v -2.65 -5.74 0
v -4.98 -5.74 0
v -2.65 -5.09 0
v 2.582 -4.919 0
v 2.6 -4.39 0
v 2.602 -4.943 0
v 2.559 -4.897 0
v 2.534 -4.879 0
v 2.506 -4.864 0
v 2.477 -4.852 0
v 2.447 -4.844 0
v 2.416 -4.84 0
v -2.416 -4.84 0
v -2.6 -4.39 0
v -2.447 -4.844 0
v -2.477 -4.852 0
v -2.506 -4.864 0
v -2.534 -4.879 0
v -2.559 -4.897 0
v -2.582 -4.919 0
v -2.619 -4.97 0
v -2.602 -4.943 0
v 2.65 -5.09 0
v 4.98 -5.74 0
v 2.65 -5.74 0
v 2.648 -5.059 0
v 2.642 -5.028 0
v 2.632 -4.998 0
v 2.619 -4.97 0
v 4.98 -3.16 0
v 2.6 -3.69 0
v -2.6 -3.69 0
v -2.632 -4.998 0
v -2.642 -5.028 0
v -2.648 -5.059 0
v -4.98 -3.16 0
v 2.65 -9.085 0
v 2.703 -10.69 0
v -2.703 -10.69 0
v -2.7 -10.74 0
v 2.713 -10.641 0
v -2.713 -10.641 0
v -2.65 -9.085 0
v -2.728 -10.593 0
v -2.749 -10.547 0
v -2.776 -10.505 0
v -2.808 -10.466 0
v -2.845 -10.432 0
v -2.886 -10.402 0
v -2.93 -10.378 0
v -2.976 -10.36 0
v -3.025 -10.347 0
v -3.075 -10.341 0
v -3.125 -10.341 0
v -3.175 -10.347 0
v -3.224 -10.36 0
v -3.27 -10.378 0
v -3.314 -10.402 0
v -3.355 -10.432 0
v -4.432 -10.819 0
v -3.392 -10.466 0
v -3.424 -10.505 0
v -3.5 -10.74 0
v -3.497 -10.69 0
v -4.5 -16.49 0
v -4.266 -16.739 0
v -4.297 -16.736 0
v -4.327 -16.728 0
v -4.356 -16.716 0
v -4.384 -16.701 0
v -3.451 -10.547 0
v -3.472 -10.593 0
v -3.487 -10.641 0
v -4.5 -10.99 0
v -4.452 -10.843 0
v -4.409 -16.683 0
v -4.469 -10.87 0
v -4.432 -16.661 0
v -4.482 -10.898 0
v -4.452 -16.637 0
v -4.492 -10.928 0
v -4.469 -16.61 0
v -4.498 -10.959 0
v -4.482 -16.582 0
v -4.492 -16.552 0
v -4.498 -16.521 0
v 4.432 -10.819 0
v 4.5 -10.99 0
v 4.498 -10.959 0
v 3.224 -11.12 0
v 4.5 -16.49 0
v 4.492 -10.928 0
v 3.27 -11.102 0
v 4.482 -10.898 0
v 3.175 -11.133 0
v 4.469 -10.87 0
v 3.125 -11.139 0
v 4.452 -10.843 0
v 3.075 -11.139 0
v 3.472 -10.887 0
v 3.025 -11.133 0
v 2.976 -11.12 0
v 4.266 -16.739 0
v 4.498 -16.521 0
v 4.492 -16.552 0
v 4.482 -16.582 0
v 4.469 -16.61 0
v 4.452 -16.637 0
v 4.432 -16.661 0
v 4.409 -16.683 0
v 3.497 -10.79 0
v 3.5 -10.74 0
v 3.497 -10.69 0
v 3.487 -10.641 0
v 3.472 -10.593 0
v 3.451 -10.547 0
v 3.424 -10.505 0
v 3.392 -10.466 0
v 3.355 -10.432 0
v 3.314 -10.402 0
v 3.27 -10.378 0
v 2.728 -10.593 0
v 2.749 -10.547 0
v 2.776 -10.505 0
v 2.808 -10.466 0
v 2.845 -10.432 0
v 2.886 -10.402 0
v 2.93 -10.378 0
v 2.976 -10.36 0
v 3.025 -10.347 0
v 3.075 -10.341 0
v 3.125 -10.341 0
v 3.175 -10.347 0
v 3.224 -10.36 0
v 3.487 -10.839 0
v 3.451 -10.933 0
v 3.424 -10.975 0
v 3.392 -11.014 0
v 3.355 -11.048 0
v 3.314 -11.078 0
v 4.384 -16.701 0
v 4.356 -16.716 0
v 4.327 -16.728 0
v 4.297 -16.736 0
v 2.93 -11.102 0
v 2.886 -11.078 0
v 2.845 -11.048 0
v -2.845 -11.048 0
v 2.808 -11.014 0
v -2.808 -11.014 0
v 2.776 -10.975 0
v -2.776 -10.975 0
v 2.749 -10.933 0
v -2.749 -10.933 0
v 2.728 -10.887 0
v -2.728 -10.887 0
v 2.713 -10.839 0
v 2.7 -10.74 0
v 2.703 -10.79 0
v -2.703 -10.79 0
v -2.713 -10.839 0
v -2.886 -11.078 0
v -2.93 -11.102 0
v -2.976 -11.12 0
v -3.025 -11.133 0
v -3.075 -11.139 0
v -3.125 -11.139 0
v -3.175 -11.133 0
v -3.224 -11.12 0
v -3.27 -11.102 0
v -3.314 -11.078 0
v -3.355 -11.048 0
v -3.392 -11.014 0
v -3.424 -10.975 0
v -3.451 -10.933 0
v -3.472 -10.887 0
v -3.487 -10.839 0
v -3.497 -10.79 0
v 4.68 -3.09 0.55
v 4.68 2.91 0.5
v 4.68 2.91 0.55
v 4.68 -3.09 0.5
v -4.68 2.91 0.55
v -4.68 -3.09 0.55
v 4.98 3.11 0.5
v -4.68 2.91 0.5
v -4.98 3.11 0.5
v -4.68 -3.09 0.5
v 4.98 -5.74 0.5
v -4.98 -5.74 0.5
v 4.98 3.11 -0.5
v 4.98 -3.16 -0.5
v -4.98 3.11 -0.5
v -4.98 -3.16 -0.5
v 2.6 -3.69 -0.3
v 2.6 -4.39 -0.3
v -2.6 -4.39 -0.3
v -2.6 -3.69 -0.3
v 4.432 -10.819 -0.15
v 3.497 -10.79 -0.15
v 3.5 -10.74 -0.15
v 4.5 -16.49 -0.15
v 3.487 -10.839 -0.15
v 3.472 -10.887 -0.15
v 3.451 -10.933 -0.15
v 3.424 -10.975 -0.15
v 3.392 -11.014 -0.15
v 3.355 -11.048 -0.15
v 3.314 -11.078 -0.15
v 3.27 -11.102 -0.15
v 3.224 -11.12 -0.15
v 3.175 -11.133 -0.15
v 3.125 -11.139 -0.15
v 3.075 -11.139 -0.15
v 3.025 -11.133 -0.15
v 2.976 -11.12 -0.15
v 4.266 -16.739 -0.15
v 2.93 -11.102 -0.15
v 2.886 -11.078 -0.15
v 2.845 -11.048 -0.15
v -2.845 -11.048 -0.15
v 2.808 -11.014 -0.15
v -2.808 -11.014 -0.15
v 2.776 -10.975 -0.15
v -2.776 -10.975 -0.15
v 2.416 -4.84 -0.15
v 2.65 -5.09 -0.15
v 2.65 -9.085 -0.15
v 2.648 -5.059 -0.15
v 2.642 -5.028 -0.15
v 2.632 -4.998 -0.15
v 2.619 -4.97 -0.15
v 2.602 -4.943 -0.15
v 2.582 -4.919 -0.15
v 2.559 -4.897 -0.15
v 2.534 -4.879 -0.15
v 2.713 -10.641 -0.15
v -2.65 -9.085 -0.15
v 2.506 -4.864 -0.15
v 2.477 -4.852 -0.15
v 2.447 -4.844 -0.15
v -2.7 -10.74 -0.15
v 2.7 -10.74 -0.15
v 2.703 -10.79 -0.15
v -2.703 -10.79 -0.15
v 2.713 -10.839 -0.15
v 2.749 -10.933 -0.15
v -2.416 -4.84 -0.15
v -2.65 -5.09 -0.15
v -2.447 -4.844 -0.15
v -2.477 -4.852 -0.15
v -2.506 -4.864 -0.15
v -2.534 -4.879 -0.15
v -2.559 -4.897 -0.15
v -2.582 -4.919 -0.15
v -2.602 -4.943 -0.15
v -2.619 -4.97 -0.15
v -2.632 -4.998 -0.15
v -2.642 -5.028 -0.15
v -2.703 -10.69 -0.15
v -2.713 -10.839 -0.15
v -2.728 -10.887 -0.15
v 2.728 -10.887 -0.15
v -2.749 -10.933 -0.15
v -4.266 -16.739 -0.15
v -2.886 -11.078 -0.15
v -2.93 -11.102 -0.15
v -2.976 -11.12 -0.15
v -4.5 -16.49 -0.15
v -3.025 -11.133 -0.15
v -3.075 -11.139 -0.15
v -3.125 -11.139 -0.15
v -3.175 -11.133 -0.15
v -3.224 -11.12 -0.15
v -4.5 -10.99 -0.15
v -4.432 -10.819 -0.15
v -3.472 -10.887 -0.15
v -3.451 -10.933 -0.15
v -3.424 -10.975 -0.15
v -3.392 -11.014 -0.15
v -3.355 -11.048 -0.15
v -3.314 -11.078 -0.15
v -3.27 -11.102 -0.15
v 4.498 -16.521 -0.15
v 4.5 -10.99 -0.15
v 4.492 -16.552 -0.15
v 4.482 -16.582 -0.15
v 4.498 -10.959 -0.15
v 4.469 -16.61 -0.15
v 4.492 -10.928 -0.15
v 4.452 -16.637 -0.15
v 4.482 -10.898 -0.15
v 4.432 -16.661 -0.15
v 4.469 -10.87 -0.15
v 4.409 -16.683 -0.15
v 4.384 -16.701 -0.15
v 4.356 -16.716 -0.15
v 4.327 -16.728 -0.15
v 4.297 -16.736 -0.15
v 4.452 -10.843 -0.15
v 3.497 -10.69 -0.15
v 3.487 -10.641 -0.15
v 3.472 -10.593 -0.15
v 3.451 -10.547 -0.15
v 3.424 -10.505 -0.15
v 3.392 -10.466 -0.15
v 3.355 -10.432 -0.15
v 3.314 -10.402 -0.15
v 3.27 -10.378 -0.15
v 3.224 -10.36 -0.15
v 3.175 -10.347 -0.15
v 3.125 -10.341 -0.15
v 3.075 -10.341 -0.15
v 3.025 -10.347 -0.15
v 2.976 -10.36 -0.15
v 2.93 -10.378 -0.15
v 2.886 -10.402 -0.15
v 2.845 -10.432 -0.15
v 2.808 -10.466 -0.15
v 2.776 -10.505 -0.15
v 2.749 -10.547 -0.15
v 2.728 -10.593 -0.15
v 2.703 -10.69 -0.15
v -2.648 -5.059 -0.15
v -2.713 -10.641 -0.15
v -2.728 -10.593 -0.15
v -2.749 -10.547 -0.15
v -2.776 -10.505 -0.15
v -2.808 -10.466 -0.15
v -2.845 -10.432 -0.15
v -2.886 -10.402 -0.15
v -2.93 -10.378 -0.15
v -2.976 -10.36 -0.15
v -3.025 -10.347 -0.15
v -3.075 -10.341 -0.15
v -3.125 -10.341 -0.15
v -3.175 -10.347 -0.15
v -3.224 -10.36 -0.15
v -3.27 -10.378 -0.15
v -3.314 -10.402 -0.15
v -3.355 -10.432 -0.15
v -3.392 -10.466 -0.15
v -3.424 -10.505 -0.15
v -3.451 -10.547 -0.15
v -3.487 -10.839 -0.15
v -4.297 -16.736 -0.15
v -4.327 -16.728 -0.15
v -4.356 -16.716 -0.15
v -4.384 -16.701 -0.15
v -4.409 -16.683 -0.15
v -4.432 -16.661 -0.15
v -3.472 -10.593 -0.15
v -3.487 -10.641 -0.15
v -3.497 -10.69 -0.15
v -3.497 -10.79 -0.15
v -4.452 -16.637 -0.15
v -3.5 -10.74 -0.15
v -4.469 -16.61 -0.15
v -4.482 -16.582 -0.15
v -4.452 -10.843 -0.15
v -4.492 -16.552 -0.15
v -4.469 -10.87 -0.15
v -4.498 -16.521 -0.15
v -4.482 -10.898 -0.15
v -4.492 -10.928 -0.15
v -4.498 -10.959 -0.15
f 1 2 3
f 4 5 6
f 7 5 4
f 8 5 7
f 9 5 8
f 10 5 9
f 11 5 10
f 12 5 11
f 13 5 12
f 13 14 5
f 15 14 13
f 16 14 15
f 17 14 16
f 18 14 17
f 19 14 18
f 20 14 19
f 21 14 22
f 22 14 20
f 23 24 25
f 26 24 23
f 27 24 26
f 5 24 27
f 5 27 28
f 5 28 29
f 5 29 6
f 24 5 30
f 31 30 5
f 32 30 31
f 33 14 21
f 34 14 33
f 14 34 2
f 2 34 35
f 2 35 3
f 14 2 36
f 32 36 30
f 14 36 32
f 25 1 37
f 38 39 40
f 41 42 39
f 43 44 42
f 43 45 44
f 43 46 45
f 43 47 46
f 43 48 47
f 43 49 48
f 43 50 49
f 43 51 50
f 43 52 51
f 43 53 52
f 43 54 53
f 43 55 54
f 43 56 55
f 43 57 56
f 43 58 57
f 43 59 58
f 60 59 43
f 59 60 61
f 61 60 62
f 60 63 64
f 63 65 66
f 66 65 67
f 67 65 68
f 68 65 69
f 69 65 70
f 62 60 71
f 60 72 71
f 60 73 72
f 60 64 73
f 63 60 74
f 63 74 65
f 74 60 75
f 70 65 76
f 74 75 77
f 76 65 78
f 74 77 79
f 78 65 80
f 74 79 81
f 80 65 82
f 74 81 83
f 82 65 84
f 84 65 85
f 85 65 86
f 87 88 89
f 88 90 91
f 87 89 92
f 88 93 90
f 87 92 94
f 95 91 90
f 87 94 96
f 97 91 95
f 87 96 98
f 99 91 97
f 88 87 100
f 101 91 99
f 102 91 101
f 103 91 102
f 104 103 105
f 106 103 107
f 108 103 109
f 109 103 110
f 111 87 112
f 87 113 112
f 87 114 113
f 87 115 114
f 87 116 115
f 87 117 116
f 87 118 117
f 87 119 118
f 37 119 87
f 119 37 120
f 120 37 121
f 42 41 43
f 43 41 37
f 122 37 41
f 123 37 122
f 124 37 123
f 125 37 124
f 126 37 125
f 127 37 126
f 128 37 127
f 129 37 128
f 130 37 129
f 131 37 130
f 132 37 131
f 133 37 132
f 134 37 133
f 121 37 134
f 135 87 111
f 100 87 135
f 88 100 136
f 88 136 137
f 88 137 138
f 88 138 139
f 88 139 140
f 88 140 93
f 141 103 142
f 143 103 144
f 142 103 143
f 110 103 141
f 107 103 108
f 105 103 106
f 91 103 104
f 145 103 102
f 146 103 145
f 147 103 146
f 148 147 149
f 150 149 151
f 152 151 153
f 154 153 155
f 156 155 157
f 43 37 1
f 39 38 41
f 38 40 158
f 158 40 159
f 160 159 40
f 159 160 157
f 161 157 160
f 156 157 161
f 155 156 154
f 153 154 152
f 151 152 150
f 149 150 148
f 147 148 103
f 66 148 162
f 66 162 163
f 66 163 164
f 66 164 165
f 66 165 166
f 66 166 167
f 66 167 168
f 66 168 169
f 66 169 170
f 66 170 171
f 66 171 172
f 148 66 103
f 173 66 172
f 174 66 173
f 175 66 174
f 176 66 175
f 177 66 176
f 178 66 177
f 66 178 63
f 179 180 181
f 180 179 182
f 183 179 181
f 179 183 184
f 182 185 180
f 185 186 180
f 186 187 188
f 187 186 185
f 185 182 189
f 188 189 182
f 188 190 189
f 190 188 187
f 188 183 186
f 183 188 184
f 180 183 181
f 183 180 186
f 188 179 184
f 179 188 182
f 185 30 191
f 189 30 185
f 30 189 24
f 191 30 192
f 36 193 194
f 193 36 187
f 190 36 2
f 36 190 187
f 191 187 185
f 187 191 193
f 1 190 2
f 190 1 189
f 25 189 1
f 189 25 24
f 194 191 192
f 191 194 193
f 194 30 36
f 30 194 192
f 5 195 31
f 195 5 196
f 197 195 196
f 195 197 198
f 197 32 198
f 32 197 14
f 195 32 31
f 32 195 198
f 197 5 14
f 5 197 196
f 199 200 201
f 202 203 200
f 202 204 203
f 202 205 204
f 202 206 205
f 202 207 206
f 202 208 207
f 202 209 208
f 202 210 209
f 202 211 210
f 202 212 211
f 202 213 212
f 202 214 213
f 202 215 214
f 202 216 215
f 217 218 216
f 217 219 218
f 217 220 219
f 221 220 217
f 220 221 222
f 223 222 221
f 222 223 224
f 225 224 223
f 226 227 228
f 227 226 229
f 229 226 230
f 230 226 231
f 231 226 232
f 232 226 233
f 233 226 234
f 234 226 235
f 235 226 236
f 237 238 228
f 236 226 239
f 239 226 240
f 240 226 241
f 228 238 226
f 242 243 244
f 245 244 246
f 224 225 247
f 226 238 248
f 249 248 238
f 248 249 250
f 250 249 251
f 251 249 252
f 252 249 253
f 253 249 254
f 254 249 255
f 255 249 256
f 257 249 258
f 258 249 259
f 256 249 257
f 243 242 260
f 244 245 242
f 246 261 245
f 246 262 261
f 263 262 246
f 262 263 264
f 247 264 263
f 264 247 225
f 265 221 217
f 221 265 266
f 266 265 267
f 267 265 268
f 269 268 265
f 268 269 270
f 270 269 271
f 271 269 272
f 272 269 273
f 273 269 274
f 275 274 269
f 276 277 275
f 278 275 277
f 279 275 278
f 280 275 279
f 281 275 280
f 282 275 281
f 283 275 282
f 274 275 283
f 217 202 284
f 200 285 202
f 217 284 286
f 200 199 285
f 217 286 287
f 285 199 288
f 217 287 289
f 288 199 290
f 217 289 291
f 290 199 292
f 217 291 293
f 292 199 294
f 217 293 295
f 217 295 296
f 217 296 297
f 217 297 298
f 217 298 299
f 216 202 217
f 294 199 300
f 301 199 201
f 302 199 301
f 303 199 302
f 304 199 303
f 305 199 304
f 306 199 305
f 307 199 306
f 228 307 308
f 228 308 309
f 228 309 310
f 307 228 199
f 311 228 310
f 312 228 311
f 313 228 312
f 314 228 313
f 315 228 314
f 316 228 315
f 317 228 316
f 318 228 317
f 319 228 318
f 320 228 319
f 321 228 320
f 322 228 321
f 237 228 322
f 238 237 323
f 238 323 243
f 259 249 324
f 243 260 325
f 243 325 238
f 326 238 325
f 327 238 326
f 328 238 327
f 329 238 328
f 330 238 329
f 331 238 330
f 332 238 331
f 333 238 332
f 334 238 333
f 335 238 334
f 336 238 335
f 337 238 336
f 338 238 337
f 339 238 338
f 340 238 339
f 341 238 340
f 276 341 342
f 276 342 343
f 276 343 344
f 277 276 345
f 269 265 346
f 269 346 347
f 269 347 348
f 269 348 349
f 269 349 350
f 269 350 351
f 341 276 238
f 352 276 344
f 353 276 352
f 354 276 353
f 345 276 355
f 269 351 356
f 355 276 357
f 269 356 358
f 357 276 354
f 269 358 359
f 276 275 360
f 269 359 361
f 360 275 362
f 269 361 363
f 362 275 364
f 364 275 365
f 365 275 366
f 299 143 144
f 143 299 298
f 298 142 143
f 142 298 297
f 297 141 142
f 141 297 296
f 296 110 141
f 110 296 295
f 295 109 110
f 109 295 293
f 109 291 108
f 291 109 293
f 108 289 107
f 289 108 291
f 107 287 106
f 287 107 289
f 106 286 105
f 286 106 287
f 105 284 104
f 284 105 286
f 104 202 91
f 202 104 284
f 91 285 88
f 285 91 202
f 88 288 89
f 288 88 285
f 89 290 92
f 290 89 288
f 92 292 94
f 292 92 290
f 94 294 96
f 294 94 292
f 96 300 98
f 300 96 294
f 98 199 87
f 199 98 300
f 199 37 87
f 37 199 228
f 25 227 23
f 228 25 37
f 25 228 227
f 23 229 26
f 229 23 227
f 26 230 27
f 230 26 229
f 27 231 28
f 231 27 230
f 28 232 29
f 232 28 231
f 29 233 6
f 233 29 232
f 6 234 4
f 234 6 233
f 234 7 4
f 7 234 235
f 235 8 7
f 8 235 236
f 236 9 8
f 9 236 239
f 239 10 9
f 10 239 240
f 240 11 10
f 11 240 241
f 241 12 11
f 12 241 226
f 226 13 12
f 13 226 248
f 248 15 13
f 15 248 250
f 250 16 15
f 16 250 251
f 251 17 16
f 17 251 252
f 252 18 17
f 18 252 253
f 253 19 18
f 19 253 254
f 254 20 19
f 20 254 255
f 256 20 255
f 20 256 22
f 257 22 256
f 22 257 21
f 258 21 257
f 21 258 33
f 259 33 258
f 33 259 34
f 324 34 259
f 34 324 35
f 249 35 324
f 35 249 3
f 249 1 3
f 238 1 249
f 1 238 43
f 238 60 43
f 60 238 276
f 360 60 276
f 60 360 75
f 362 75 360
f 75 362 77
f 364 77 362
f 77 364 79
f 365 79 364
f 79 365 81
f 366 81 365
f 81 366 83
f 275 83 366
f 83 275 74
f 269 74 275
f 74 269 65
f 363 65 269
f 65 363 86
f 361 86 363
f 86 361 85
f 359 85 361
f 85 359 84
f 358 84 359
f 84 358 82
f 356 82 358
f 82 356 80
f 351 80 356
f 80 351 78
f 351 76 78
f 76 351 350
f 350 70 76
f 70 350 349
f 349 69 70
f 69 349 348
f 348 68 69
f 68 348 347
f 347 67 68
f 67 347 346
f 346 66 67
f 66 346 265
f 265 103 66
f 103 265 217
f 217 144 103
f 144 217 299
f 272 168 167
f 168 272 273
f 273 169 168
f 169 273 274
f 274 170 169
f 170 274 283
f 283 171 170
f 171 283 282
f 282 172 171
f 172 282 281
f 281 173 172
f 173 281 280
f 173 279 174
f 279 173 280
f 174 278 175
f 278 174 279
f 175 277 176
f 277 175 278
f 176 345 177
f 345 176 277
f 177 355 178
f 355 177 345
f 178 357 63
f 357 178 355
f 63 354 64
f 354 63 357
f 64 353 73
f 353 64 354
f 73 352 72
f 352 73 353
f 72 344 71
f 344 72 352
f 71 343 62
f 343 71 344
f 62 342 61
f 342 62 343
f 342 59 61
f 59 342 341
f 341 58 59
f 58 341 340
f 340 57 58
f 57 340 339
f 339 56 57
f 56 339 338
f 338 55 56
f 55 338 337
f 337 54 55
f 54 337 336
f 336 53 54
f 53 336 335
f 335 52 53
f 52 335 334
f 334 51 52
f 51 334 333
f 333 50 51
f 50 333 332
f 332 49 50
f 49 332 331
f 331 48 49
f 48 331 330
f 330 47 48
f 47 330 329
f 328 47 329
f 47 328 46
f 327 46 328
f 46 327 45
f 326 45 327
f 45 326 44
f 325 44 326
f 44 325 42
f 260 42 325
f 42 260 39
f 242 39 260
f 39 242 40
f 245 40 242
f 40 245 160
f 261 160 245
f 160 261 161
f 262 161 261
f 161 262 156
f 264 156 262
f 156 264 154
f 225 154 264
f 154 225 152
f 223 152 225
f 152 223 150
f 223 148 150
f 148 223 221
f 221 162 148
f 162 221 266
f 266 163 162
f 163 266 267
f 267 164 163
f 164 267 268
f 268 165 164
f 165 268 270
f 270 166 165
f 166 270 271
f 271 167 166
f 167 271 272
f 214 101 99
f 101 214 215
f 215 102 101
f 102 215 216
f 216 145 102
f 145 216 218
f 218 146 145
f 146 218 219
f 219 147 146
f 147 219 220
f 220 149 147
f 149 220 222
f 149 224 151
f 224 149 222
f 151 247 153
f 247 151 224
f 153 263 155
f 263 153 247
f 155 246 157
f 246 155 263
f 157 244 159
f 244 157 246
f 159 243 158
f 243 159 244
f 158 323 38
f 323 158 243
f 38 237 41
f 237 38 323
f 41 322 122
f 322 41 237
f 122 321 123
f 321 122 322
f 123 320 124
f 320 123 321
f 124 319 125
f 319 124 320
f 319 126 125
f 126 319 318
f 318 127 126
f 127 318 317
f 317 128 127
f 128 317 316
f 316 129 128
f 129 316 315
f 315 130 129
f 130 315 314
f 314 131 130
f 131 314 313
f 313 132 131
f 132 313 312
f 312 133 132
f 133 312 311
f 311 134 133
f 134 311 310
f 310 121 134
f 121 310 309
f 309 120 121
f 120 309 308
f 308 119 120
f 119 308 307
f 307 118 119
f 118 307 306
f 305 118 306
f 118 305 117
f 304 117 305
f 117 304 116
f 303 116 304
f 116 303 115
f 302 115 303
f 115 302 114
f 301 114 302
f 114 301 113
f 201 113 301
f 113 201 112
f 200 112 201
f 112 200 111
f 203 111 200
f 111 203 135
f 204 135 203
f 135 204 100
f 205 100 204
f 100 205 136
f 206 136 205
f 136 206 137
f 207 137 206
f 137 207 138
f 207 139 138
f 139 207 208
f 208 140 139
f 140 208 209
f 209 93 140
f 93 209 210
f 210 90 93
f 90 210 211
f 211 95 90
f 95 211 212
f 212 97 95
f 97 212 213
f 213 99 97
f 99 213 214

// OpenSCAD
$fn=50;

TP_TOX32();
module TP_TOX32(){
  //https://tailorpixels.com/de/PRODUKTE/0-32-Zoll-oled-60x32-wei%C3%9F-i2c-ssd1315/
  glassThck=0.5;
  
  //Flex
  flxRad=0.25; //edge rad of Flex
  flxPnlDims=[5.3,0.9]; //Dimensions of Flex on Panel
  flxTapDims=[9,6];
  flxThck=0.15;
  //Length of Flex from panel to tap
  flxLen=11;
  //holes in the flex
  flxHoleDist=6.2;
  flxHoleDia=0.8;
  //offset from bottom
  flxHoleBtmOffset=6;
  
  //Panel
  panelDims=[9.96,8.85,1.0];
  polDims=[9.36,6,0.05];
  botGlassDims=[panelDims.x,6.27,glassThck];
  chipDims=[5.2,0.7,0.3];
  
  //Active Area
  AADims=[7.06,3.82,0.01]; //active Area
  
  //panel offsets from top left corner
  pol2PanelOffset=[0,-0.2,glassThck+polDims.z/2];
  AA2PanelOffset=[0,-1.2,AADims.z/2];
  bot2PanelOffset=[0,0,-glassThck/2];
  chip2PanelOffset=[0,-6.8,-chipDims.z/2];
  //
  panel2CenterOffset=[0,-panelDims.y/2+1.2+AADims.y/2,0];
  
  pitch=0.62;
  padDim=[2,0.32,0.01];
  pads=14;
  
  
//Panel
translate(panel2CenterOffset){
  //Active Area
  color("SlateGrey") translate([0,(panelDims.y-AADims.y)/2,0]+AA2PanelOffset) cube(AADims,true);
  //Polarizer
  color("grey",0.5)
    translate([0,(panelDims.y-polDims.y)/2,0]+pol2PanelOffset) cube(polDims,true);
  //topGlass
  color("lightgrey",0.5) 
    translate([0,0,glassThck/2]) cube([panelDims.x,panelDims.y,glassThck],true);
  //btmGlass
  color("lightgrey",0.5)
    translate([0,(panelDims.y-botGlassDims.y)/2,0]+bot2PanelOffset) cube(botGlassDims,true);
  //chip
  color("darkSlateGrey")
    translate([0,(panelDims.y-chipDims.y)/2,0]+chip2PanelOffset) cube(chipDims,true);
}
  //flex();
  translate([0,-panelDims.y/2,-flxThck]+panel2CenterOffset) flex();
  module flex(){
    
    linear_extrude(flxThck) difference(){
      union(){
        //tap
        hull(){
          for (ix=[-1,1],iy=[-1,1])
            translate([ix*(flxTapDims.x/2-flxRad),iy*(flxTapDims.y/2-flxRad)-flxLen+flxTapDims.y/2]) circle(flxRad);
        }
        //main
        hull(){
          for (ix=[-1,1],iy=[-1,1])
            translate([ix*(flxPnlDims.x/2-flxRad),iy*((flxLen+flxPnlDims.y)/2-flxRad)-(flxLen-flxPnlDims.y)/2]) 
              circle(flxRad);
        }
        //45° transistion between tap an main flex
        hull(){
         for (ix=[-1,1])
            translate([ix*(flxPnlDims.x/2-flxRad),((flxLen+flxPnlDims.y)/2-flxRad)-flxLen+(flxTapDims.x-flxPnlDims.x)/2]) 
              circle(flxRad);
          for (ix=[-1,1])
            translate([ix*(flxTapDims.x/2-flxRad),(flxTapDims.y/2-flxRad)-flxLen+flxTapDims.y/2]) circle(flxRad);
          }
        }
      
      for (ix=[-1,1])
        translate([ix*flxHoleDist/2,flxHoleBtmOffset-flxLen]) circle(d=flxHoleDia);
    }
  }
}
